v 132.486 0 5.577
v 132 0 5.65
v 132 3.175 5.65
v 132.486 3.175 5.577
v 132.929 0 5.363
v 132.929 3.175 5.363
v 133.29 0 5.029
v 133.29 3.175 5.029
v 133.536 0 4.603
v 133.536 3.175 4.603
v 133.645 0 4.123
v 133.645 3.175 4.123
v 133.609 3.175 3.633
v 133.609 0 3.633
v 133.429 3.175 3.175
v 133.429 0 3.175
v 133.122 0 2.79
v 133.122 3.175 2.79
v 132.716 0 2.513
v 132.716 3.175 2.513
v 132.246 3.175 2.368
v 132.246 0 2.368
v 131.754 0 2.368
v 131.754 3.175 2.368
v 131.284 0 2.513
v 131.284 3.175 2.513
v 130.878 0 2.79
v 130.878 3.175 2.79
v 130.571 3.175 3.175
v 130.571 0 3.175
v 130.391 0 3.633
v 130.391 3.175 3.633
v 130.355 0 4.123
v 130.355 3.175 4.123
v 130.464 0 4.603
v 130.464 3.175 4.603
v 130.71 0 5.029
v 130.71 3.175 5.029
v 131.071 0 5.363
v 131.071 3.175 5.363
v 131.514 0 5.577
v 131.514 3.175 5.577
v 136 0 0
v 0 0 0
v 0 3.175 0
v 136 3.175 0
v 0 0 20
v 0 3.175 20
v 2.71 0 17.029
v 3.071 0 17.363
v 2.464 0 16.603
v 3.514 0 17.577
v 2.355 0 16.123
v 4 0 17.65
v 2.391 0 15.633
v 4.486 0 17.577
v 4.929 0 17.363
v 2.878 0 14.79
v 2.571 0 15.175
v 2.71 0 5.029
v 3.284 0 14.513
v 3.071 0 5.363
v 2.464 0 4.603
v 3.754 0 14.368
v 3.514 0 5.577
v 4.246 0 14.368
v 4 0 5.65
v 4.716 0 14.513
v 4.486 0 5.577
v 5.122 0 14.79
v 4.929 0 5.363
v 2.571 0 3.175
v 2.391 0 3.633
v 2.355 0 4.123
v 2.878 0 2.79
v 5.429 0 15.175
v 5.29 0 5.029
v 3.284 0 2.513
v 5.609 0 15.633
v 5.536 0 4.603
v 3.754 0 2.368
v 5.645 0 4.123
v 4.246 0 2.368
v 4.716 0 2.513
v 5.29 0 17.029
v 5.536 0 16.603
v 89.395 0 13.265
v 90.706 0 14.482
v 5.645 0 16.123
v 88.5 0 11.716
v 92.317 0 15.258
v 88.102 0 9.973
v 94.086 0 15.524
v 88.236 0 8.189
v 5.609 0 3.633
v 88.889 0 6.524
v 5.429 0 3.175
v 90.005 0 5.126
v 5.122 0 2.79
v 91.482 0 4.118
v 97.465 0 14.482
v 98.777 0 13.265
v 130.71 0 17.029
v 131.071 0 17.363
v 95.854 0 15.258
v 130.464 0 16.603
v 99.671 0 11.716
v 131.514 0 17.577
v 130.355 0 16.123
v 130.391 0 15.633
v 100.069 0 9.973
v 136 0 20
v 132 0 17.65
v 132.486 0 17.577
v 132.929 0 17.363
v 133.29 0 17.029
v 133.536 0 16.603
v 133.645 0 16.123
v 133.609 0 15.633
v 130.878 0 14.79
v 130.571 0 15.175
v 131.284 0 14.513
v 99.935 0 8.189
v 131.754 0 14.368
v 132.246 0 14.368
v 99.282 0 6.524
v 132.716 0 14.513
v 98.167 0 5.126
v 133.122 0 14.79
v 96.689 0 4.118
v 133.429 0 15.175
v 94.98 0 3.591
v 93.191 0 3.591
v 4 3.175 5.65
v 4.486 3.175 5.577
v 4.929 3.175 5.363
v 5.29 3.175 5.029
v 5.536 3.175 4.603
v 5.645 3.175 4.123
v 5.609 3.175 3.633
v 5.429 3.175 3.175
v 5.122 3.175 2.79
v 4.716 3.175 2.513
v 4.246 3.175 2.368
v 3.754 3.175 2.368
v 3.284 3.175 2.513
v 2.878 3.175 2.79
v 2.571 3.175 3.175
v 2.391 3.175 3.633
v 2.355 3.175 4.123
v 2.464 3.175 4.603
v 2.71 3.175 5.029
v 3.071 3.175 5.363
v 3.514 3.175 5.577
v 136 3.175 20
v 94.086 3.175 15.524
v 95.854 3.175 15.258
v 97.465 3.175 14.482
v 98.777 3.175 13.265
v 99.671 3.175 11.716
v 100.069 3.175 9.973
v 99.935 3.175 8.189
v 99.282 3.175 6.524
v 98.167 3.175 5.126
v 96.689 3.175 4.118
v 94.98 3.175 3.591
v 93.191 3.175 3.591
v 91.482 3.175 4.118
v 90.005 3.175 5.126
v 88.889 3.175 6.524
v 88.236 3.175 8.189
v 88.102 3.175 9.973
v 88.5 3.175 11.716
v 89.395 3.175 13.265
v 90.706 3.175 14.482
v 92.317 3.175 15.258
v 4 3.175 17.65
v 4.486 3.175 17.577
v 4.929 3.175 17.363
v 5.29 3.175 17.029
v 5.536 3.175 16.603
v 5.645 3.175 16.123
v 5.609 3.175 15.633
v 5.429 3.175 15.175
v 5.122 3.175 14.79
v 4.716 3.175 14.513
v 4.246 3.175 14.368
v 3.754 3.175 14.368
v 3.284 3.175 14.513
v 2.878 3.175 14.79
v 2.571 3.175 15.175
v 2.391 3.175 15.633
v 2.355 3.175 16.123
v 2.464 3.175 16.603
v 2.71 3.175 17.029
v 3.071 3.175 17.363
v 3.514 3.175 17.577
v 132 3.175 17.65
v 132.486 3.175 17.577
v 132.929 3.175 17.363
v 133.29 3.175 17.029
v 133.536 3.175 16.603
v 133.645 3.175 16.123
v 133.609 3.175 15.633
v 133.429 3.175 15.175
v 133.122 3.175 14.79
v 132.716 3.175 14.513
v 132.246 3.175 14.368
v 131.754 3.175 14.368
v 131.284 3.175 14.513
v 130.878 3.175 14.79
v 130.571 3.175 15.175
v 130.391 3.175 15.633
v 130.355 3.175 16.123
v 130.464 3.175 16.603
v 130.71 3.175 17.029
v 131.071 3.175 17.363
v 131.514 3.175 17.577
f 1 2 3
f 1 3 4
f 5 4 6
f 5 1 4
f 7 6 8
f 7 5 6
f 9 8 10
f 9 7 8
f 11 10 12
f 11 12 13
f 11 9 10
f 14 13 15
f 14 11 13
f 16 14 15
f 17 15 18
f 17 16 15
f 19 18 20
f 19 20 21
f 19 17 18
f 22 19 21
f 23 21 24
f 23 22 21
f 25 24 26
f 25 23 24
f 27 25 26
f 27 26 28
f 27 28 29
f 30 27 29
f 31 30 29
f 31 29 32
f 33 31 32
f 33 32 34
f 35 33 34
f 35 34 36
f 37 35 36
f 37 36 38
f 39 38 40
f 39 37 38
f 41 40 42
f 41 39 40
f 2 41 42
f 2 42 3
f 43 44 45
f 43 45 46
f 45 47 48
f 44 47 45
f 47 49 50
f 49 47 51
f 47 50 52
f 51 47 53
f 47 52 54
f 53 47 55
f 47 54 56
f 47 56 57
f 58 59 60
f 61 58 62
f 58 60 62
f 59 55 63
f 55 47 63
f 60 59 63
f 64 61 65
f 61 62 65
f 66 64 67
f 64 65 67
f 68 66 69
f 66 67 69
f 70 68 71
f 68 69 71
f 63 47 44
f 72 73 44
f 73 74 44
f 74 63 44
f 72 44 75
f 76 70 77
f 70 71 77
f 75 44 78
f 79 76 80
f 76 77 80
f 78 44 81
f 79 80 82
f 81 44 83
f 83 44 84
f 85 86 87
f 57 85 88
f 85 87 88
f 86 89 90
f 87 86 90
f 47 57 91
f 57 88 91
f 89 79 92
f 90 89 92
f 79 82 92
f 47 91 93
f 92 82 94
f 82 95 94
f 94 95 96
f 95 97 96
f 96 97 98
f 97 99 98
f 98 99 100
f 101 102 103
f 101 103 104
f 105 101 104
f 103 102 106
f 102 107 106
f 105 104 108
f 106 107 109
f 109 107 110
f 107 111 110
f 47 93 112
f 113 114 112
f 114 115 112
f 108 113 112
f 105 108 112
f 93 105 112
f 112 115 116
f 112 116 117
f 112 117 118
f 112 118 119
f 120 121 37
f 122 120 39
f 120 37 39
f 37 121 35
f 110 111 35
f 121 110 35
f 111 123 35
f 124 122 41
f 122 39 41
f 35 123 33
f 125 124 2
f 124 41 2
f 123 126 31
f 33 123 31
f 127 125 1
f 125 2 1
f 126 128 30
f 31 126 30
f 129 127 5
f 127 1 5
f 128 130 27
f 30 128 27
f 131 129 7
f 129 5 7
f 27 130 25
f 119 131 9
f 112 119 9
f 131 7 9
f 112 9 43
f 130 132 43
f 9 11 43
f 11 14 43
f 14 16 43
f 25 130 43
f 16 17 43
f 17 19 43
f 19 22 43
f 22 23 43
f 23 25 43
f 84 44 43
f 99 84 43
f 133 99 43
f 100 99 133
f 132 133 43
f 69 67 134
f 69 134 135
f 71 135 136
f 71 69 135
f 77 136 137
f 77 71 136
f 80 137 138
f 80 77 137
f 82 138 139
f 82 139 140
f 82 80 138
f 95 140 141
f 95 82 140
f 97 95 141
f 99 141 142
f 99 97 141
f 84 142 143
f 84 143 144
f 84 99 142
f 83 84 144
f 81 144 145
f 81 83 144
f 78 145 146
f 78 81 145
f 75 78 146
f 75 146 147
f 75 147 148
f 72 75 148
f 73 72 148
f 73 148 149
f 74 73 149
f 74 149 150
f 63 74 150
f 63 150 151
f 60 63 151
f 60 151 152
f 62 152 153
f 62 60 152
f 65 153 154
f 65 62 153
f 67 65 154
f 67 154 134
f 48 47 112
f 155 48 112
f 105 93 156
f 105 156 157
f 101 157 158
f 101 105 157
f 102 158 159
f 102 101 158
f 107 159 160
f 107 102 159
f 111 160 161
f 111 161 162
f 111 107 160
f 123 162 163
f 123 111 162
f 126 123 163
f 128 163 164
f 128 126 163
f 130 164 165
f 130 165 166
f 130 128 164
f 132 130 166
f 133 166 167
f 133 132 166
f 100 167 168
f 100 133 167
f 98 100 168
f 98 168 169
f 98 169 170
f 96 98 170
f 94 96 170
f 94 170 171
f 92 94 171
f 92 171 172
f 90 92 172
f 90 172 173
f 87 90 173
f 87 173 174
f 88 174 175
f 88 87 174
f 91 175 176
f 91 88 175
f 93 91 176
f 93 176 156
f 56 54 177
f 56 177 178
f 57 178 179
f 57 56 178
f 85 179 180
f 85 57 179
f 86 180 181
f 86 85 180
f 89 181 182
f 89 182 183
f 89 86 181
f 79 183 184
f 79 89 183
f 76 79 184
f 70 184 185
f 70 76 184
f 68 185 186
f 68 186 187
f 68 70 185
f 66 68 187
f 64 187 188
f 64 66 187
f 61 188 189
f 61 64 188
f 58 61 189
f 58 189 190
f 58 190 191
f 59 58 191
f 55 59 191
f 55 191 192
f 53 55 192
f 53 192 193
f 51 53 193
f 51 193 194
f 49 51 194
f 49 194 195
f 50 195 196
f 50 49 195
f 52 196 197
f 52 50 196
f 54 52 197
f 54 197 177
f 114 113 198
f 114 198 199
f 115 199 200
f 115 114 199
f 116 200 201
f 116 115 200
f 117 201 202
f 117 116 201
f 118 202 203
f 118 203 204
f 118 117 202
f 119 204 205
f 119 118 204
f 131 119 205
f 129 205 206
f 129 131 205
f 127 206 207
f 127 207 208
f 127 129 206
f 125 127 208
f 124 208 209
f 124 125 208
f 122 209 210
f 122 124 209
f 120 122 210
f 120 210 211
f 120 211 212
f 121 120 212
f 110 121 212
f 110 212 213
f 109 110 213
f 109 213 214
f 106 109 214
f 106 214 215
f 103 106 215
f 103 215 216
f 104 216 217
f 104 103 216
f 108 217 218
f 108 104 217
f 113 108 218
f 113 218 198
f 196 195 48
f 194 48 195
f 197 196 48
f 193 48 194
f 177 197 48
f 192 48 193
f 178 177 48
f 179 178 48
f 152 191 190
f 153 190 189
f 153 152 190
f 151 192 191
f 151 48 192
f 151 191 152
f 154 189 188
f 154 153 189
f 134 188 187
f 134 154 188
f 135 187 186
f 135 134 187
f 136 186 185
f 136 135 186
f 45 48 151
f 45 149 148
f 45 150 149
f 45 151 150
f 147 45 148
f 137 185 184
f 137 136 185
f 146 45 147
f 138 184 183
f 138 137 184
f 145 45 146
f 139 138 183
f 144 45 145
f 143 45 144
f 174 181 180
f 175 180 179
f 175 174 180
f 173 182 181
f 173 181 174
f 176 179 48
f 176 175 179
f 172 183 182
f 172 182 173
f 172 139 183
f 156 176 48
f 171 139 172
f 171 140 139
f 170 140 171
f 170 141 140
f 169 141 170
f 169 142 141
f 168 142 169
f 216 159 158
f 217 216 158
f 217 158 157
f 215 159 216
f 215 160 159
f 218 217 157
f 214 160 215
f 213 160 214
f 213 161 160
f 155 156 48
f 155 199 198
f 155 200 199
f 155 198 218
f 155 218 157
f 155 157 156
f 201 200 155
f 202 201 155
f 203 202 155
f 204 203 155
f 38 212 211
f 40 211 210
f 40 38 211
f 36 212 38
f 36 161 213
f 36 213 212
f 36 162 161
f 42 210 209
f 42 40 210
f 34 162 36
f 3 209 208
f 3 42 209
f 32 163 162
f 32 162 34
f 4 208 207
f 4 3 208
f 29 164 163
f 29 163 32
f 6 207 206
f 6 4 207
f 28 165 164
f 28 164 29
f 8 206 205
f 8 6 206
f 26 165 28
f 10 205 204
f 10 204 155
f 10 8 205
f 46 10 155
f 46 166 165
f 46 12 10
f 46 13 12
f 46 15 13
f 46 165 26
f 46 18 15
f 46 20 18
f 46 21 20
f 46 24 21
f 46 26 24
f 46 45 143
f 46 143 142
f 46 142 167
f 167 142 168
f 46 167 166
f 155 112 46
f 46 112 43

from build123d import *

# Parameters (mm, degrees)
SKETCH1_W           = 136
SKETCH1_H           = 20
SKETCH1_R           = 1.65
SKETCH1_R_2         = 6
BOSS_EXTRUDE1_DEPTH = 3.175


with BuildPart() as part:
    # Sketch1 → Boss-Extrude1 (new body)
    with BuildSketch(Plane(origin=(0, 0, 0), x_dir=(1, 0, 0), z_dir=(0, 1, 0))):
        with Locations((68, -10)):
            Rectangle(SKETCH1_W, SKETCH1_H)
        with Locations(Location((4, -4, 0), (0, 0, 270))):
            Circle(SKETCH1_R, mode=Mode.SUBTRACT)
        with Locations(Location((132, -4, 0), (0, 0, 270))):
            Circle(SKETCH1_R, mode=Mode.SUBTRACT)
        with Locations(Location((94.08554011, -9.52416591, 0), (0, 0, 270))):
            Circle(SKETCH1_R_2, mode=Mode.SUBTRACT)
        with Locations(Location((4, -16, 0), (0, 0, 270))):
            Circle(SKETCH1_R, mode=Mode.SUBTRACT)
        with Locations(Location((132, -16, 0), (0, 0, 270))):
            Circle(SKETCH1_R, mode=Mode.SUBTRACT)
    extrude(amount=BOSS_EXTRUDE1_DEPTH)


solid = part.part
